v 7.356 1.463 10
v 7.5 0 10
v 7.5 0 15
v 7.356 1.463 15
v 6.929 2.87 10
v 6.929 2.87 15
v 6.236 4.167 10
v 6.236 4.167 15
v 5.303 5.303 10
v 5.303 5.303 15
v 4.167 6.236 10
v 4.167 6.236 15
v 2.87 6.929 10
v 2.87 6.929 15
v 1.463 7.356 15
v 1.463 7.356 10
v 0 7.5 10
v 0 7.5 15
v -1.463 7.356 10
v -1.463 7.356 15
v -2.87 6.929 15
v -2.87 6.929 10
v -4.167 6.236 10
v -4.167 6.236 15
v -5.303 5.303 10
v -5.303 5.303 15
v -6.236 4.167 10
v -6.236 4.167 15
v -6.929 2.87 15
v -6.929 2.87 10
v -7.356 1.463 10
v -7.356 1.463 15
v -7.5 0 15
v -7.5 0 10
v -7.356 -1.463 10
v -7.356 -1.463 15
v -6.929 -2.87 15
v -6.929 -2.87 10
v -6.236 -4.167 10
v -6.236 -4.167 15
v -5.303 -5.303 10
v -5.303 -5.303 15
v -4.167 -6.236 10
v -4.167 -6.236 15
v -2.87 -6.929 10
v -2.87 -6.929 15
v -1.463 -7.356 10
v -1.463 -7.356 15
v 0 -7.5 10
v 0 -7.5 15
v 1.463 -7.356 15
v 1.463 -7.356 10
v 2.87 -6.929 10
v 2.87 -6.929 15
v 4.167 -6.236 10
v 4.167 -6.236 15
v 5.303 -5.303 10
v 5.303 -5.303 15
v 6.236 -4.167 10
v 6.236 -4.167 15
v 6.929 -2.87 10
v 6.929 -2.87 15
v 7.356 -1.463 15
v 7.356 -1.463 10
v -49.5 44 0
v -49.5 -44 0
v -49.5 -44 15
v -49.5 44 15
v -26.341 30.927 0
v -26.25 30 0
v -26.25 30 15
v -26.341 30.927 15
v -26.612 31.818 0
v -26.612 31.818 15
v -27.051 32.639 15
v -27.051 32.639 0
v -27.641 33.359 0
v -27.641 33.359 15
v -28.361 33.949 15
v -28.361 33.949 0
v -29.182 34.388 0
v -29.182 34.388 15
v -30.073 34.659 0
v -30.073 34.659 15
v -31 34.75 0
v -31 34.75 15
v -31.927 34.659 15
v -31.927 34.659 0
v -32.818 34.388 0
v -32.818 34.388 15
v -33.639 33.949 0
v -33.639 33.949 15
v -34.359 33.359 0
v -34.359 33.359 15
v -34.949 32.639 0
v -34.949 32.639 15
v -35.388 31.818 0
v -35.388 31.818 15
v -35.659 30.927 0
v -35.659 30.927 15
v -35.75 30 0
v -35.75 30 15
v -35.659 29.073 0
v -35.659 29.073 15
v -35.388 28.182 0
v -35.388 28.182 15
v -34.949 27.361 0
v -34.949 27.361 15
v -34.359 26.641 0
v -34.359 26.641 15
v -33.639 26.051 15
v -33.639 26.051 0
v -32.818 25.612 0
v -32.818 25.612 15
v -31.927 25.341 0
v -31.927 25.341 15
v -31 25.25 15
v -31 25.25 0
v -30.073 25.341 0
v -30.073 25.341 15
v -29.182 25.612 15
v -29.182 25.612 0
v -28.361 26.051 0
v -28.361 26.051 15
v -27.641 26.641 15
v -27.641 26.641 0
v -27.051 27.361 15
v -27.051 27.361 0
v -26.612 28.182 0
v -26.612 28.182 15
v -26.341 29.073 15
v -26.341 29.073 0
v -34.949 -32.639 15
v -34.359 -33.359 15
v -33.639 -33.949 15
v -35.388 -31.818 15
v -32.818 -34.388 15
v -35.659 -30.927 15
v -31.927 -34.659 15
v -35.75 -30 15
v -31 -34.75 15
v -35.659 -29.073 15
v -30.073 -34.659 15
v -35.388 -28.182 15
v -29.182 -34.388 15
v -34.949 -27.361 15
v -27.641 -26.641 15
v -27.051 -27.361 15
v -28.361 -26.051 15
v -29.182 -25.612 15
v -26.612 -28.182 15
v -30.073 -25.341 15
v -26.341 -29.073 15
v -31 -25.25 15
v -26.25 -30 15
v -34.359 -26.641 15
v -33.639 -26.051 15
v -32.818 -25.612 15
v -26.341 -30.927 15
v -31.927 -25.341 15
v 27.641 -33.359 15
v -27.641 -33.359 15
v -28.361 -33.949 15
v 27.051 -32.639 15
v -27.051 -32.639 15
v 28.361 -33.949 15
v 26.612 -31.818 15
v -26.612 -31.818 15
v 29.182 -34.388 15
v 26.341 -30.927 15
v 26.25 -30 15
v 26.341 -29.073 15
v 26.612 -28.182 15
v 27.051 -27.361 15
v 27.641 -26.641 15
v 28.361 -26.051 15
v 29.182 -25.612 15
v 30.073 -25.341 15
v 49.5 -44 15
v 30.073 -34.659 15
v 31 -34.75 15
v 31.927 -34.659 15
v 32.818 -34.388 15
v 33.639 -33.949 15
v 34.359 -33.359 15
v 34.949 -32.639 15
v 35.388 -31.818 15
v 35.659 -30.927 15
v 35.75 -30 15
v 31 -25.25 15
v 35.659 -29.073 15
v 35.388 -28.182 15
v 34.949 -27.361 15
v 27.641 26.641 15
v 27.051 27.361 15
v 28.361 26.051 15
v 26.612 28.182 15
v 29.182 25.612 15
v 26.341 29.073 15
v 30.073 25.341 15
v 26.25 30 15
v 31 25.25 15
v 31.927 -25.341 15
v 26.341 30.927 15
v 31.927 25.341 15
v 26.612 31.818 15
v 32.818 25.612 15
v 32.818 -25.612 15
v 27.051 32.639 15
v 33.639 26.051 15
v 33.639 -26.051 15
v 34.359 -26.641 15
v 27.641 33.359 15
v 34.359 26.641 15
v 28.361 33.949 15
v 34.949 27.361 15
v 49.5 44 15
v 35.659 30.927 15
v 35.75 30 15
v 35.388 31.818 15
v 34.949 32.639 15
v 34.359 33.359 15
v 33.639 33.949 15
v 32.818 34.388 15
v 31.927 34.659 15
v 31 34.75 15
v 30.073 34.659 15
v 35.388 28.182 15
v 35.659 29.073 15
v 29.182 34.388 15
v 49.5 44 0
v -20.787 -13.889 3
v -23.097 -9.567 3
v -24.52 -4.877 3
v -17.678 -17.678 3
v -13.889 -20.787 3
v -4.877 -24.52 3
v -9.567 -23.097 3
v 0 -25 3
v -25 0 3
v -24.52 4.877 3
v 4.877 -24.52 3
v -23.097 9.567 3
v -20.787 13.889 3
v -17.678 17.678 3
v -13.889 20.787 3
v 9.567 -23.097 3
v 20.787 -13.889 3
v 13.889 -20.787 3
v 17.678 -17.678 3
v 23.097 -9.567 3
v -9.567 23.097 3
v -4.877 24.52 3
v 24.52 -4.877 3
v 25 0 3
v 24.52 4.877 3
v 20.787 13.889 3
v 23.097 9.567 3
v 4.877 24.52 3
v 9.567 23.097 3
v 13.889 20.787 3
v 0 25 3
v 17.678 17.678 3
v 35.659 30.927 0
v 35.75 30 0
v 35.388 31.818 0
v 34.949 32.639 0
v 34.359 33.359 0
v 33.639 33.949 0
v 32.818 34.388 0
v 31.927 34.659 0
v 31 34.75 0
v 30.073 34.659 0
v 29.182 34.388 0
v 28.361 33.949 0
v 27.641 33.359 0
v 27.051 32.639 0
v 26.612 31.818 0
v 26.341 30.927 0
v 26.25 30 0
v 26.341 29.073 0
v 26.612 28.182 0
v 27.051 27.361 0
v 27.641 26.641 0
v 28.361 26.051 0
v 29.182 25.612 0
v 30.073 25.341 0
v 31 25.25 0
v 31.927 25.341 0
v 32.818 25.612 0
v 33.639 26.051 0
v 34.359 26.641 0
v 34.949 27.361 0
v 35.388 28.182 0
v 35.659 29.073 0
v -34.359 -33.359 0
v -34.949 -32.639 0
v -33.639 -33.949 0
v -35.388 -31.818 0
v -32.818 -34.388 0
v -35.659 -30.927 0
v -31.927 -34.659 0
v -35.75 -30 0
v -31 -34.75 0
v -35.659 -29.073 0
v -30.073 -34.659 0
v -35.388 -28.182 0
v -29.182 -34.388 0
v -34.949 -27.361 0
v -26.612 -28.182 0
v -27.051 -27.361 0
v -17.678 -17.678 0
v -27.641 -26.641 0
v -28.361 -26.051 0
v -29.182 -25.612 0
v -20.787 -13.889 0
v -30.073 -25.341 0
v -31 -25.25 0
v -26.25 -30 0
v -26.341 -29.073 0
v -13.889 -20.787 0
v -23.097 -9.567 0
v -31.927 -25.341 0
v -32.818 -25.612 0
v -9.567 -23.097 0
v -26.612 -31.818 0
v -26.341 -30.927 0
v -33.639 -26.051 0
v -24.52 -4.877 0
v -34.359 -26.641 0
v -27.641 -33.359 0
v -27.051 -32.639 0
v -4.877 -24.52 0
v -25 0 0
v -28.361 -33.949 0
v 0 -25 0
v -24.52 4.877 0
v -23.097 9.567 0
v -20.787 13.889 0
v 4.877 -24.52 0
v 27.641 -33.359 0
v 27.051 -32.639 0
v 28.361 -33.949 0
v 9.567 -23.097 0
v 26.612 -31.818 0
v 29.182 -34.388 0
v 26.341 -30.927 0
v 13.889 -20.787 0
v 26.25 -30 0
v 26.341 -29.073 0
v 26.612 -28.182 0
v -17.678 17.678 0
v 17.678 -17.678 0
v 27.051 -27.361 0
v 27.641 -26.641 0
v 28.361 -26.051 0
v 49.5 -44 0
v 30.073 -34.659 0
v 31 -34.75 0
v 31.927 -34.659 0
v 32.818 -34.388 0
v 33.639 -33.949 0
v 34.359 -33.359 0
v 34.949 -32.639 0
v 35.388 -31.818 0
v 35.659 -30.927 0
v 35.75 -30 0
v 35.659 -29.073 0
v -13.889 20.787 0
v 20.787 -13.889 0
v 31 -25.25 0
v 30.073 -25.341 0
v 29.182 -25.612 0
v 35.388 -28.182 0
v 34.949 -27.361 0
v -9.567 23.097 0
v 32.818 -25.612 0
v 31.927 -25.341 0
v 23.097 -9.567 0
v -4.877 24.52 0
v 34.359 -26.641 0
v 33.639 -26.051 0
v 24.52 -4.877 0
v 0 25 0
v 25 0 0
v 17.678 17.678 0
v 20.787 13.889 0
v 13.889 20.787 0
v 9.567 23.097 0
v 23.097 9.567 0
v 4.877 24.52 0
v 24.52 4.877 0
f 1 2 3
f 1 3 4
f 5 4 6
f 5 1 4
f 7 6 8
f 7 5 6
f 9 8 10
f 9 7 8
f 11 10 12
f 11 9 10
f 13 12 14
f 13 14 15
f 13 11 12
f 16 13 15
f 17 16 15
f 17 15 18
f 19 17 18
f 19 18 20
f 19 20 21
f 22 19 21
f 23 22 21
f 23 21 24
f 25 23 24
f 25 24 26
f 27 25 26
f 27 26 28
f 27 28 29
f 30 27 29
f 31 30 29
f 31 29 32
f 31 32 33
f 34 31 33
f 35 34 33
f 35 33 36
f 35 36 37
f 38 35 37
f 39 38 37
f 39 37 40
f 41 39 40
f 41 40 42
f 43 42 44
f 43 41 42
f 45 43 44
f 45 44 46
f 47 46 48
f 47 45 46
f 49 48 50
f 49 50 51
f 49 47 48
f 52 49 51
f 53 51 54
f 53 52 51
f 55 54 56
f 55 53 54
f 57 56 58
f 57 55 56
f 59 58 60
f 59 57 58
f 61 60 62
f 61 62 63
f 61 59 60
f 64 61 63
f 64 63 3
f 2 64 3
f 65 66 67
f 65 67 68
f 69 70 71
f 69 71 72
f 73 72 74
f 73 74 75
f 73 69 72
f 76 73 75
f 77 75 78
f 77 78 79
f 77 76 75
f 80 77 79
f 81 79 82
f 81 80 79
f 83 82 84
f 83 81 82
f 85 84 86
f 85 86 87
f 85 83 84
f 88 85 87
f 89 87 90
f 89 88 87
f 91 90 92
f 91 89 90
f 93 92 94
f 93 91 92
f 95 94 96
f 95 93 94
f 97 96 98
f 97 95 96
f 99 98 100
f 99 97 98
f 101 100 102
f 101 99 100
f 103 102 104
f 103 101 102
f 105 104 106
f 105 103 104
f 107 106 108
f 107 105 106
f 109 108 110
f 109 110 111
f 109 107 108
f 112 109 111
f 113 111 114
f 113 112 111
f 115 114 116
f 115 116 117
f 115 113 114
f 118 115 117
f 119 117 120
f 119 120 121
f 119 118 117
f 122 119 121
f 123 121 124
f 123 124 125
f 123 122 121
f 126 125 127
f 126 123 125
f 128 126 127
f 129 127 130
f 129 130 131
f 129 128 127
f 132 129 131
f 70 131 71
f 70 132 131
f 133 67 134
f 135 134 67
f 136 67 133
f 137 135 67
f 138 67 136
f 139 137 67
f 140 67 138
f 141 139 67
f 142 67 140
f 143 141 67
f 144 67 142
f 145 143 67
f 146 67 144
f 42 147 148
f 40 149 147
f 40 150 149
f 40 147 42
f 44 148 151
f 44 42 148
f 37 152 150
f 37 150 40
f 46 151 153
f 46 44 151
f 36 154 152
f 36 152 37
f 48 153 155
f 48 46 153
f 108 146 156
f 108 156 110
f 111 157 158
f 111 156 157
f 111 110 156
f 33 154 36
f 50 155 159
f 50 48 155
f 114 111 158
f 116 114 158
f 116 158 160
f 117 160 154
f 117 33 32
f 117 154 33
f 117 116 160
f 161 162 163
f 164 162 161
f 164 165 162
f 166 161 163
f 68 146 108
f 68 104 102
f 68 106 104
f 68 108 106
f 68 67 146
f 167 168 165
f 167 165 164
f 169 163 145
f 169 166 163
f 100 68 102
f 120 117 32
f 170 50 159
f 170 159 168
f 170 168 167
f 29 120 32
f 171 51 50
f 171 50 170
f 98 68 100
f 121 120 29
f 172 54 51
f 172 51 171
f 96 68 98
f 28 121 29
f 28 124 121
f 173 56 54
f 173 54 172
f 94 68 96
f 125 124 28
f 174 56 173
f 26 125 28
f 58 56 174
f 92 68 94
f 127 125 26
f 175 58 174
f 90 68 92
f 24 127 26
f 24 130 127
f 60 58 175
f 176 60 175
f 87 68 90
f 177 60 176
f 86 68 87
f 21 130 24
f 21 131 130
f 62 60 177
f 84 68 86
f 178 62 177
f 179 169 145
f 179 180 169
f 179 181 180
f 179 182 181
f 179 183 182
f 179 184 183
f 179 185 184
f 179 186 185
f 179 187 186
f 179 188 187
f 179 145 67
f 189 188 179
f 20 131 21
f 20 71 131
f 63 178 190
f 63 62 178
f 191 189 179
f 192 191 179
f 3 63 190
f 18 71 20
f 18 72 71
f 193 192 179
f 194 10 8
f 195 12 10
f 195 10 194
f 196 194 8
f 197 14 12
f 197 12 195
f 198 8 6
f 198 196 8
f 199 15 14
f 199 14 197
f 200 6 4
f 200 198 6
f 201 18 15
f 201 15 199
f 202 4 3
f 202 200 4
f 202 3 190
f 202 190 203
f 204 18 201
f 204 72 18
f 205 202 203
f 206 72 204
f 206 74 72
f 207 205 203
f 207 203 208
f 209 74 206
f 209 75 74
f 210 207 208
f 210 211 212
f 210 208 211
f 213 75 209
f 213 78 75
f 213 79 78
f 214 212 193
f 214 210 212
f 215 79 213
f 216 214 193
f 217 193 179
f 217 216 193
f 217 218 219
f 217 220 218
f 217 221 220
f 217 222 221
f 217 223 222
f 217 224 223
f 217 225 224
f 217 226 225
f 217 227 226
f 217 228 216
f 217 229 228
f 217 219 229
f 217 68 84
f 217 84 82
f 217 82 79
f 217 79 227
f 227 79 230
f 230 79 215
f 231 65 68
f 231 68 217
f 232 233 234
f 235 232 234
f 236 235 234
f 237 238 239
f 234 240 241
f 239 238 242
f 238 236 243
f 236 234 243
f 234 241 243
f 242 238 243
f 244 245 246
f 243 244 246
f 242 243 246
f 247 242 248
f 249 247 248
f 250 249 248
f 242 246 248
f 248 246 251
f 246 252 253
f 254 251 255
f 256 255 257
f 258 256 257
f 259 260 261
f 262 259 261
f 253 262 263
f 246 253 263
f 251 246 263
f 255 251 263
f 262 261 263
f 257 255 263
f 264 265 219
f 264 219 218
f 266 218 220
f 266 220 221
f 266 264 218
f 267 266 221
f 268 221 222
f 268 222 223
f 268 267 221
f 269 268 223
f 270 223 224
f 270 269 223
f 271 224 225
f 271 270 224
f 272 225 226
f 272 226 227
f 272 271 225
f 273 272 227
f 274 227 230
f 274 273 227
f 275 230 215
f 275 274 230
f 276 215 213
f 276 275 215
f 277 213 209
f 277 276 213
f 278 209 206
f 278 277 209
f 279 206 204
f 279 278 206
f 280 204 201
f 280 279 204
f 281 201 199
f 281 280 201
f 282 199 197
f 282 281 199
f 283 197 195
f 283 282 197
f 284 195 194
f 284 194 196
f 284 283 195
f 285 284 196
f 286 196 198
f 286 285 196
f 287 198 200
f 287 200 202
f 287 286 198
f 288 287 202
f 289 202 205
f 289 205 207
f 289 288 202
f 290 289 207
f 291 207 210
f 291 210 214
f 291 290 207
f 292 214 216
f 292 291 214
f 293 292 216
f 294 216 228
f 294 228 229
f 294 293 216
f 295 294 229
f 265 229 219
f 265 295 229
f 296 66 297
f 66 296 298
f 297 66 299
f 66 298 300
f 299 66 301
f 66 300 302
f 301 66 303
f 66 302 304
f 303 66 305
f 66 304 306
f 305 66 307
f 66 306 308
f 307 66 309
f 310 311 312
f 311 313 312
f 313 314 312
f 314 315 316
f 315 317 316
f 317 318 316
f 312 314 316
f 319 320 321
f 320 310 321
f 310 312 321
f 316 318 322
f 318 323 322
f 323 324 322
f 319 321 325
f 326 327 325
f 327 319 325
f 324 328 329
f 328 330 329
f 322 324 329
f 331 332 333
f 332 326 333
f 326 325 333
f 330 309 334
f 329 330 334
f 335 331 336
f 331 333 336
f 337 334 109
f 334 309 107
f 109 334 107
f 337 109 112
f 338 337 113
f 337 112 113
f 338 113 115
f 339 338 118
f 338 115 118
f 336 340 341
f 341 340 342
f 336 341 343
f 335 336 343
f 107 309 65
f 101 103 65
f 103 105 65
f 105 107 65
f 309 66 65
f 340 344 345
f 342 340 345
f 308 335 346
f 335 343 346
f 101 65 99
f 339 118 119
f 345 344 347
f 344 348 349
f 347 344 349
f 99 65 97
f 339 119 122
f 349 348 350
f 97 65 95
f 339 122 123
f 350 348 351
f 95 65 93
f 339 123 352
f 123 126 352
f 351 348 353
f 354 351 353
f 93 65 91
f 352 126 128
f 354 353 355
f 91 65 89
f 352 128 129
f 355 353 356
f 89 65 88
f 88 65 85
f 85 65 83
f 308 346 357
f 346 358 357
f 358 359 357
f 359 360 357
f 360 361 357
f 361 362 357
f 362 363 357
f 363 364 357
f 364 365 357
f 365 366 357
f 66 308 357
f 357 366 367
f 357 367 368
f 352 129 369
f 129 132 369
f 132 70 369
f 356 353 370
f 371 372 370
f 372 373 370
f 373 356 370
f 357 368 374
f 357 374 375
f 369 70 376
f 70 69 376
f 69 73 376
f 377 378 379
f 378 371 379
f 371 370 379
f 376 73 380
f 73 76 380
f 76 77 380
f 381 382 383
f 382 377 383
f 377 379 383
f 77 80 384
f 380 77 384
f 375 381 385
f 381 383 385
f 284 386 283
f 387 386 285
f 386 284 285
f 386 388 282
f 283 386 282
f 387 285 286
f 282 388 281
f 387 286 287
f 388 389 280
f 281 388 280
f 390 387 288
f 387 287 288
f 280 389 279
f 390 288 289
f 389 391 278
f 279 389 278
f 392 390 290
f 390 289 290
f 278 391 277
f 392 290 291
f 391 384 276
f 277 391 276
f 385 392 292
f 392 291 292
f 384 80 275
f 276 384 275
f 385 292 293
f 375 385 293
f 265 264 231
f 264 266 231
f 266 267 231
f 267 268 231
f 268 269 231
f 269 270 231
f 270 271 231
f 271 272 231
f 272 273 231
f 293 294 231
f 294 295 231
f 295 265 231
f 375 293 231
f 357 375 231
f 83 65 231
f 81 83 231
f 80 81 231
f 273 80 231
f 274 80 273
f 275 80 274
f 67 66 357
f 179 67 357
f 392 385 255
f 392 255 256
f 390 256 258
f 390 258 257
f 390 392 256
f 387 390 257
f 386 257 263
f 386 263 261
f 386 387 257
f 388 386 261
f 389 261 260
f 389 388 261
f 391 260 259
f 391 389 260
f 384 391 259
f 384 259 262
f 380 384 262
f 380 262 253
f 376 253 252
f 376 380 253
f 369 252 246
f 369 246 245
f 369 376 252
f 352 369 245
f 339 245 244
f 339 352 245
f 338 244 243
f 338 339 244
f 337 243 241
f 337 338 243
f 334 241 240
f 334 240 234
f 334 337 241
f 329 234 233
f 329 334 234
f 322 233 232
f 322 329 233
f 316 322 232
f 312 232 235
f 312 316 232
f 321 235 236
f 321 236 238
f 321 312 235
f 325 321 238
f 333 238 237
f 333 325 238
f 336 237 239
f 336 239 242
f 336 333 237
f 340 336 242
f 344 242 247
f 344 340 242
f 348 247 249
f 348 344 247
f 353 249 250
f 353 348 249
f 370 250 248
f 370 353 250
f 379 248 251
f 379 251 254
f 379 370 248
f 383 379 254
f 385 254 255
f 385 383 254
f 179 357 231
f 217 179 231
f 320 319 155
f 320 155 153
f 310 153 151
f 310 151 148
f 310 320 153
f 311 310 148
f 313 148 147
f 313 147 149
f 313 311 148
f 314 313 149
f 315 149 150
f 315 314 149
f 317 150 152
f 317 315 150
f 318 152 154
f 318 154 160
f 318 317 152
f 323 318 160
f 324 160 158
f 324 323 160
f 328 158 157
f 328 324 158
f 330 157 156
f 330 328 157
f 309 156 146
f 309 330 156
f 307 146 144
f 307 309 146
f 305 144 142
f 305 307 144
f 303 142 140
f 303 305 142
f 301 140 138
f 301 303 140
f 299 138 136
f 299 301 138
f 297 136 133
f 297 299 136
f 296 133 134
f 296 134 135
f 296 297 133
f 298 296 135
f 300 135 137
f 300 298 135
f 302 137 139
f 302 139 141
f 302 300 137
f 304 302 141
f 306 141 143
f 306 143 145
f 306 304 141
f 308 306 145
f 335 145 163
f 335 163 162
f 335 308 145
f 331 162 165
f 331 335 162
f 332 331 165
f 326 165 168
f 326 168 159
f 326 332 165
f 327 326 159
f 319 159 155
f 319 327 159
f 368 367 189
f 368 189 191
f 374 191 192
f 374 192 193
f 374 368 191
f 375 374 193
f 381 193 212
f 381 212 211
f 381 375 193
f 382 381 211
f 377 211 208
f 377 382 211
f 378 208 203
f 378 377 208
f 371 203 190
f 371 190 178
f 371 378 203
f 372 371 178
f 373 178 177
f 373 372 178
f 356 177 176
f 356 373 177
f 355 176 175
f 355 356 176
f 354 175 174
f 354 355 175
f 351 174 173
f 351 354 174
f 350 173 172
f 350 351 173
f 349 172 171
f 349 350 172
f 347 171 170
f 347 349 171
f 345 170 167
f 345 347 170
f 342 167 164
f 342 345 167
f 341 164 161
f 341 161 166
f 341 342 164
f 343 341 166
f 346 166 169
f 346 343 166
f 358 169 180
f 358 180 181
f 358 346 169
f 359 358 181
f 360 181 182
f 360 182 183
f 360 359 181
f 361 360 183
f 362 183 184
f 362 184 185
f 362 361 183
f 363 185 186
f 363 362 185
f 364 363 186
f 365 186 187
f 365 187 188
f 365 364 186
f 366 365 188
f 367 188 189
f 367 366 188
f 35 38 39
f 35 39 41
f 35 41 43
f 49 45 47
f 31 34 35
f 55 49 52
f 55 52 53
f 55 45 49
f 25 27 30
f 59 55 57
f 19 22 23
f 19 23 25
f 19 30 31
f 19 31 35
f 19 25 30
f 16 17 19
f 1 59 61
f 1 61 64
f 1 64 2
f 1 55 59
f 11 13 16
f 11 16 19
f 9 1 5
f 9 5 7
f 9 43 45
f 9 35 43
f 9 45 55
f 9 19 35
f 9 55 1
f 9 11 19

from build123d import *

# Parameters (mm, degrees)
F0_R     = 7.5
F1_DEPTH = 10
F0_W     = 99
F0_H     = 88
F0_R_2   = 4.75
F2_DEPTH = 15
F3_R     = 25
F3_R_2   = 7.5
F4_DEPTH = 3


with BuildPart() as f1:
    # F0 (on Top) → F1 (new body)
    with BuildSketch(Plane.XY):
        Circle(F0_R)
    extrude(amount=F1_DEPTH)

    # F0 (on Top) → F2 (join)
    with BuildSketch(Plane.XY):
        Rectangle(F0_W, F0_H)
        with Locations((-31, -30)):
            Circle(F0_R_2, mode=Mode.SUBTRACT)
        with Locations((31, -30)):
            Circle(F0_R_2, mode=Mode.SUBTRACT)
        with Locations((-31, 30)):
            Circle(F0_R_2, mode=Mode.SUBTRACT)
        Circle(F0_R, mode=Mode.SUBTRACT)
        with Locations((31, 30)):
            Circle(F0_R_2, mode=Mode.SUBTRACT)
    extrude(amount=F2_DEPTH)

    # F3 (on face) + F0 (on Top) → F4 (cut)
    with BuildSketch(Plane.XY):
        Circle(F3_R)
        Circle(F3_R_2, mode=Mode.SUBTRACT)
    with BuildSketch(Plane.XY):
        Circle(F0_R)
    extrude(amount=F4_DEPTH, mode=Mode.SUBTRACT)


solid = f1.part
